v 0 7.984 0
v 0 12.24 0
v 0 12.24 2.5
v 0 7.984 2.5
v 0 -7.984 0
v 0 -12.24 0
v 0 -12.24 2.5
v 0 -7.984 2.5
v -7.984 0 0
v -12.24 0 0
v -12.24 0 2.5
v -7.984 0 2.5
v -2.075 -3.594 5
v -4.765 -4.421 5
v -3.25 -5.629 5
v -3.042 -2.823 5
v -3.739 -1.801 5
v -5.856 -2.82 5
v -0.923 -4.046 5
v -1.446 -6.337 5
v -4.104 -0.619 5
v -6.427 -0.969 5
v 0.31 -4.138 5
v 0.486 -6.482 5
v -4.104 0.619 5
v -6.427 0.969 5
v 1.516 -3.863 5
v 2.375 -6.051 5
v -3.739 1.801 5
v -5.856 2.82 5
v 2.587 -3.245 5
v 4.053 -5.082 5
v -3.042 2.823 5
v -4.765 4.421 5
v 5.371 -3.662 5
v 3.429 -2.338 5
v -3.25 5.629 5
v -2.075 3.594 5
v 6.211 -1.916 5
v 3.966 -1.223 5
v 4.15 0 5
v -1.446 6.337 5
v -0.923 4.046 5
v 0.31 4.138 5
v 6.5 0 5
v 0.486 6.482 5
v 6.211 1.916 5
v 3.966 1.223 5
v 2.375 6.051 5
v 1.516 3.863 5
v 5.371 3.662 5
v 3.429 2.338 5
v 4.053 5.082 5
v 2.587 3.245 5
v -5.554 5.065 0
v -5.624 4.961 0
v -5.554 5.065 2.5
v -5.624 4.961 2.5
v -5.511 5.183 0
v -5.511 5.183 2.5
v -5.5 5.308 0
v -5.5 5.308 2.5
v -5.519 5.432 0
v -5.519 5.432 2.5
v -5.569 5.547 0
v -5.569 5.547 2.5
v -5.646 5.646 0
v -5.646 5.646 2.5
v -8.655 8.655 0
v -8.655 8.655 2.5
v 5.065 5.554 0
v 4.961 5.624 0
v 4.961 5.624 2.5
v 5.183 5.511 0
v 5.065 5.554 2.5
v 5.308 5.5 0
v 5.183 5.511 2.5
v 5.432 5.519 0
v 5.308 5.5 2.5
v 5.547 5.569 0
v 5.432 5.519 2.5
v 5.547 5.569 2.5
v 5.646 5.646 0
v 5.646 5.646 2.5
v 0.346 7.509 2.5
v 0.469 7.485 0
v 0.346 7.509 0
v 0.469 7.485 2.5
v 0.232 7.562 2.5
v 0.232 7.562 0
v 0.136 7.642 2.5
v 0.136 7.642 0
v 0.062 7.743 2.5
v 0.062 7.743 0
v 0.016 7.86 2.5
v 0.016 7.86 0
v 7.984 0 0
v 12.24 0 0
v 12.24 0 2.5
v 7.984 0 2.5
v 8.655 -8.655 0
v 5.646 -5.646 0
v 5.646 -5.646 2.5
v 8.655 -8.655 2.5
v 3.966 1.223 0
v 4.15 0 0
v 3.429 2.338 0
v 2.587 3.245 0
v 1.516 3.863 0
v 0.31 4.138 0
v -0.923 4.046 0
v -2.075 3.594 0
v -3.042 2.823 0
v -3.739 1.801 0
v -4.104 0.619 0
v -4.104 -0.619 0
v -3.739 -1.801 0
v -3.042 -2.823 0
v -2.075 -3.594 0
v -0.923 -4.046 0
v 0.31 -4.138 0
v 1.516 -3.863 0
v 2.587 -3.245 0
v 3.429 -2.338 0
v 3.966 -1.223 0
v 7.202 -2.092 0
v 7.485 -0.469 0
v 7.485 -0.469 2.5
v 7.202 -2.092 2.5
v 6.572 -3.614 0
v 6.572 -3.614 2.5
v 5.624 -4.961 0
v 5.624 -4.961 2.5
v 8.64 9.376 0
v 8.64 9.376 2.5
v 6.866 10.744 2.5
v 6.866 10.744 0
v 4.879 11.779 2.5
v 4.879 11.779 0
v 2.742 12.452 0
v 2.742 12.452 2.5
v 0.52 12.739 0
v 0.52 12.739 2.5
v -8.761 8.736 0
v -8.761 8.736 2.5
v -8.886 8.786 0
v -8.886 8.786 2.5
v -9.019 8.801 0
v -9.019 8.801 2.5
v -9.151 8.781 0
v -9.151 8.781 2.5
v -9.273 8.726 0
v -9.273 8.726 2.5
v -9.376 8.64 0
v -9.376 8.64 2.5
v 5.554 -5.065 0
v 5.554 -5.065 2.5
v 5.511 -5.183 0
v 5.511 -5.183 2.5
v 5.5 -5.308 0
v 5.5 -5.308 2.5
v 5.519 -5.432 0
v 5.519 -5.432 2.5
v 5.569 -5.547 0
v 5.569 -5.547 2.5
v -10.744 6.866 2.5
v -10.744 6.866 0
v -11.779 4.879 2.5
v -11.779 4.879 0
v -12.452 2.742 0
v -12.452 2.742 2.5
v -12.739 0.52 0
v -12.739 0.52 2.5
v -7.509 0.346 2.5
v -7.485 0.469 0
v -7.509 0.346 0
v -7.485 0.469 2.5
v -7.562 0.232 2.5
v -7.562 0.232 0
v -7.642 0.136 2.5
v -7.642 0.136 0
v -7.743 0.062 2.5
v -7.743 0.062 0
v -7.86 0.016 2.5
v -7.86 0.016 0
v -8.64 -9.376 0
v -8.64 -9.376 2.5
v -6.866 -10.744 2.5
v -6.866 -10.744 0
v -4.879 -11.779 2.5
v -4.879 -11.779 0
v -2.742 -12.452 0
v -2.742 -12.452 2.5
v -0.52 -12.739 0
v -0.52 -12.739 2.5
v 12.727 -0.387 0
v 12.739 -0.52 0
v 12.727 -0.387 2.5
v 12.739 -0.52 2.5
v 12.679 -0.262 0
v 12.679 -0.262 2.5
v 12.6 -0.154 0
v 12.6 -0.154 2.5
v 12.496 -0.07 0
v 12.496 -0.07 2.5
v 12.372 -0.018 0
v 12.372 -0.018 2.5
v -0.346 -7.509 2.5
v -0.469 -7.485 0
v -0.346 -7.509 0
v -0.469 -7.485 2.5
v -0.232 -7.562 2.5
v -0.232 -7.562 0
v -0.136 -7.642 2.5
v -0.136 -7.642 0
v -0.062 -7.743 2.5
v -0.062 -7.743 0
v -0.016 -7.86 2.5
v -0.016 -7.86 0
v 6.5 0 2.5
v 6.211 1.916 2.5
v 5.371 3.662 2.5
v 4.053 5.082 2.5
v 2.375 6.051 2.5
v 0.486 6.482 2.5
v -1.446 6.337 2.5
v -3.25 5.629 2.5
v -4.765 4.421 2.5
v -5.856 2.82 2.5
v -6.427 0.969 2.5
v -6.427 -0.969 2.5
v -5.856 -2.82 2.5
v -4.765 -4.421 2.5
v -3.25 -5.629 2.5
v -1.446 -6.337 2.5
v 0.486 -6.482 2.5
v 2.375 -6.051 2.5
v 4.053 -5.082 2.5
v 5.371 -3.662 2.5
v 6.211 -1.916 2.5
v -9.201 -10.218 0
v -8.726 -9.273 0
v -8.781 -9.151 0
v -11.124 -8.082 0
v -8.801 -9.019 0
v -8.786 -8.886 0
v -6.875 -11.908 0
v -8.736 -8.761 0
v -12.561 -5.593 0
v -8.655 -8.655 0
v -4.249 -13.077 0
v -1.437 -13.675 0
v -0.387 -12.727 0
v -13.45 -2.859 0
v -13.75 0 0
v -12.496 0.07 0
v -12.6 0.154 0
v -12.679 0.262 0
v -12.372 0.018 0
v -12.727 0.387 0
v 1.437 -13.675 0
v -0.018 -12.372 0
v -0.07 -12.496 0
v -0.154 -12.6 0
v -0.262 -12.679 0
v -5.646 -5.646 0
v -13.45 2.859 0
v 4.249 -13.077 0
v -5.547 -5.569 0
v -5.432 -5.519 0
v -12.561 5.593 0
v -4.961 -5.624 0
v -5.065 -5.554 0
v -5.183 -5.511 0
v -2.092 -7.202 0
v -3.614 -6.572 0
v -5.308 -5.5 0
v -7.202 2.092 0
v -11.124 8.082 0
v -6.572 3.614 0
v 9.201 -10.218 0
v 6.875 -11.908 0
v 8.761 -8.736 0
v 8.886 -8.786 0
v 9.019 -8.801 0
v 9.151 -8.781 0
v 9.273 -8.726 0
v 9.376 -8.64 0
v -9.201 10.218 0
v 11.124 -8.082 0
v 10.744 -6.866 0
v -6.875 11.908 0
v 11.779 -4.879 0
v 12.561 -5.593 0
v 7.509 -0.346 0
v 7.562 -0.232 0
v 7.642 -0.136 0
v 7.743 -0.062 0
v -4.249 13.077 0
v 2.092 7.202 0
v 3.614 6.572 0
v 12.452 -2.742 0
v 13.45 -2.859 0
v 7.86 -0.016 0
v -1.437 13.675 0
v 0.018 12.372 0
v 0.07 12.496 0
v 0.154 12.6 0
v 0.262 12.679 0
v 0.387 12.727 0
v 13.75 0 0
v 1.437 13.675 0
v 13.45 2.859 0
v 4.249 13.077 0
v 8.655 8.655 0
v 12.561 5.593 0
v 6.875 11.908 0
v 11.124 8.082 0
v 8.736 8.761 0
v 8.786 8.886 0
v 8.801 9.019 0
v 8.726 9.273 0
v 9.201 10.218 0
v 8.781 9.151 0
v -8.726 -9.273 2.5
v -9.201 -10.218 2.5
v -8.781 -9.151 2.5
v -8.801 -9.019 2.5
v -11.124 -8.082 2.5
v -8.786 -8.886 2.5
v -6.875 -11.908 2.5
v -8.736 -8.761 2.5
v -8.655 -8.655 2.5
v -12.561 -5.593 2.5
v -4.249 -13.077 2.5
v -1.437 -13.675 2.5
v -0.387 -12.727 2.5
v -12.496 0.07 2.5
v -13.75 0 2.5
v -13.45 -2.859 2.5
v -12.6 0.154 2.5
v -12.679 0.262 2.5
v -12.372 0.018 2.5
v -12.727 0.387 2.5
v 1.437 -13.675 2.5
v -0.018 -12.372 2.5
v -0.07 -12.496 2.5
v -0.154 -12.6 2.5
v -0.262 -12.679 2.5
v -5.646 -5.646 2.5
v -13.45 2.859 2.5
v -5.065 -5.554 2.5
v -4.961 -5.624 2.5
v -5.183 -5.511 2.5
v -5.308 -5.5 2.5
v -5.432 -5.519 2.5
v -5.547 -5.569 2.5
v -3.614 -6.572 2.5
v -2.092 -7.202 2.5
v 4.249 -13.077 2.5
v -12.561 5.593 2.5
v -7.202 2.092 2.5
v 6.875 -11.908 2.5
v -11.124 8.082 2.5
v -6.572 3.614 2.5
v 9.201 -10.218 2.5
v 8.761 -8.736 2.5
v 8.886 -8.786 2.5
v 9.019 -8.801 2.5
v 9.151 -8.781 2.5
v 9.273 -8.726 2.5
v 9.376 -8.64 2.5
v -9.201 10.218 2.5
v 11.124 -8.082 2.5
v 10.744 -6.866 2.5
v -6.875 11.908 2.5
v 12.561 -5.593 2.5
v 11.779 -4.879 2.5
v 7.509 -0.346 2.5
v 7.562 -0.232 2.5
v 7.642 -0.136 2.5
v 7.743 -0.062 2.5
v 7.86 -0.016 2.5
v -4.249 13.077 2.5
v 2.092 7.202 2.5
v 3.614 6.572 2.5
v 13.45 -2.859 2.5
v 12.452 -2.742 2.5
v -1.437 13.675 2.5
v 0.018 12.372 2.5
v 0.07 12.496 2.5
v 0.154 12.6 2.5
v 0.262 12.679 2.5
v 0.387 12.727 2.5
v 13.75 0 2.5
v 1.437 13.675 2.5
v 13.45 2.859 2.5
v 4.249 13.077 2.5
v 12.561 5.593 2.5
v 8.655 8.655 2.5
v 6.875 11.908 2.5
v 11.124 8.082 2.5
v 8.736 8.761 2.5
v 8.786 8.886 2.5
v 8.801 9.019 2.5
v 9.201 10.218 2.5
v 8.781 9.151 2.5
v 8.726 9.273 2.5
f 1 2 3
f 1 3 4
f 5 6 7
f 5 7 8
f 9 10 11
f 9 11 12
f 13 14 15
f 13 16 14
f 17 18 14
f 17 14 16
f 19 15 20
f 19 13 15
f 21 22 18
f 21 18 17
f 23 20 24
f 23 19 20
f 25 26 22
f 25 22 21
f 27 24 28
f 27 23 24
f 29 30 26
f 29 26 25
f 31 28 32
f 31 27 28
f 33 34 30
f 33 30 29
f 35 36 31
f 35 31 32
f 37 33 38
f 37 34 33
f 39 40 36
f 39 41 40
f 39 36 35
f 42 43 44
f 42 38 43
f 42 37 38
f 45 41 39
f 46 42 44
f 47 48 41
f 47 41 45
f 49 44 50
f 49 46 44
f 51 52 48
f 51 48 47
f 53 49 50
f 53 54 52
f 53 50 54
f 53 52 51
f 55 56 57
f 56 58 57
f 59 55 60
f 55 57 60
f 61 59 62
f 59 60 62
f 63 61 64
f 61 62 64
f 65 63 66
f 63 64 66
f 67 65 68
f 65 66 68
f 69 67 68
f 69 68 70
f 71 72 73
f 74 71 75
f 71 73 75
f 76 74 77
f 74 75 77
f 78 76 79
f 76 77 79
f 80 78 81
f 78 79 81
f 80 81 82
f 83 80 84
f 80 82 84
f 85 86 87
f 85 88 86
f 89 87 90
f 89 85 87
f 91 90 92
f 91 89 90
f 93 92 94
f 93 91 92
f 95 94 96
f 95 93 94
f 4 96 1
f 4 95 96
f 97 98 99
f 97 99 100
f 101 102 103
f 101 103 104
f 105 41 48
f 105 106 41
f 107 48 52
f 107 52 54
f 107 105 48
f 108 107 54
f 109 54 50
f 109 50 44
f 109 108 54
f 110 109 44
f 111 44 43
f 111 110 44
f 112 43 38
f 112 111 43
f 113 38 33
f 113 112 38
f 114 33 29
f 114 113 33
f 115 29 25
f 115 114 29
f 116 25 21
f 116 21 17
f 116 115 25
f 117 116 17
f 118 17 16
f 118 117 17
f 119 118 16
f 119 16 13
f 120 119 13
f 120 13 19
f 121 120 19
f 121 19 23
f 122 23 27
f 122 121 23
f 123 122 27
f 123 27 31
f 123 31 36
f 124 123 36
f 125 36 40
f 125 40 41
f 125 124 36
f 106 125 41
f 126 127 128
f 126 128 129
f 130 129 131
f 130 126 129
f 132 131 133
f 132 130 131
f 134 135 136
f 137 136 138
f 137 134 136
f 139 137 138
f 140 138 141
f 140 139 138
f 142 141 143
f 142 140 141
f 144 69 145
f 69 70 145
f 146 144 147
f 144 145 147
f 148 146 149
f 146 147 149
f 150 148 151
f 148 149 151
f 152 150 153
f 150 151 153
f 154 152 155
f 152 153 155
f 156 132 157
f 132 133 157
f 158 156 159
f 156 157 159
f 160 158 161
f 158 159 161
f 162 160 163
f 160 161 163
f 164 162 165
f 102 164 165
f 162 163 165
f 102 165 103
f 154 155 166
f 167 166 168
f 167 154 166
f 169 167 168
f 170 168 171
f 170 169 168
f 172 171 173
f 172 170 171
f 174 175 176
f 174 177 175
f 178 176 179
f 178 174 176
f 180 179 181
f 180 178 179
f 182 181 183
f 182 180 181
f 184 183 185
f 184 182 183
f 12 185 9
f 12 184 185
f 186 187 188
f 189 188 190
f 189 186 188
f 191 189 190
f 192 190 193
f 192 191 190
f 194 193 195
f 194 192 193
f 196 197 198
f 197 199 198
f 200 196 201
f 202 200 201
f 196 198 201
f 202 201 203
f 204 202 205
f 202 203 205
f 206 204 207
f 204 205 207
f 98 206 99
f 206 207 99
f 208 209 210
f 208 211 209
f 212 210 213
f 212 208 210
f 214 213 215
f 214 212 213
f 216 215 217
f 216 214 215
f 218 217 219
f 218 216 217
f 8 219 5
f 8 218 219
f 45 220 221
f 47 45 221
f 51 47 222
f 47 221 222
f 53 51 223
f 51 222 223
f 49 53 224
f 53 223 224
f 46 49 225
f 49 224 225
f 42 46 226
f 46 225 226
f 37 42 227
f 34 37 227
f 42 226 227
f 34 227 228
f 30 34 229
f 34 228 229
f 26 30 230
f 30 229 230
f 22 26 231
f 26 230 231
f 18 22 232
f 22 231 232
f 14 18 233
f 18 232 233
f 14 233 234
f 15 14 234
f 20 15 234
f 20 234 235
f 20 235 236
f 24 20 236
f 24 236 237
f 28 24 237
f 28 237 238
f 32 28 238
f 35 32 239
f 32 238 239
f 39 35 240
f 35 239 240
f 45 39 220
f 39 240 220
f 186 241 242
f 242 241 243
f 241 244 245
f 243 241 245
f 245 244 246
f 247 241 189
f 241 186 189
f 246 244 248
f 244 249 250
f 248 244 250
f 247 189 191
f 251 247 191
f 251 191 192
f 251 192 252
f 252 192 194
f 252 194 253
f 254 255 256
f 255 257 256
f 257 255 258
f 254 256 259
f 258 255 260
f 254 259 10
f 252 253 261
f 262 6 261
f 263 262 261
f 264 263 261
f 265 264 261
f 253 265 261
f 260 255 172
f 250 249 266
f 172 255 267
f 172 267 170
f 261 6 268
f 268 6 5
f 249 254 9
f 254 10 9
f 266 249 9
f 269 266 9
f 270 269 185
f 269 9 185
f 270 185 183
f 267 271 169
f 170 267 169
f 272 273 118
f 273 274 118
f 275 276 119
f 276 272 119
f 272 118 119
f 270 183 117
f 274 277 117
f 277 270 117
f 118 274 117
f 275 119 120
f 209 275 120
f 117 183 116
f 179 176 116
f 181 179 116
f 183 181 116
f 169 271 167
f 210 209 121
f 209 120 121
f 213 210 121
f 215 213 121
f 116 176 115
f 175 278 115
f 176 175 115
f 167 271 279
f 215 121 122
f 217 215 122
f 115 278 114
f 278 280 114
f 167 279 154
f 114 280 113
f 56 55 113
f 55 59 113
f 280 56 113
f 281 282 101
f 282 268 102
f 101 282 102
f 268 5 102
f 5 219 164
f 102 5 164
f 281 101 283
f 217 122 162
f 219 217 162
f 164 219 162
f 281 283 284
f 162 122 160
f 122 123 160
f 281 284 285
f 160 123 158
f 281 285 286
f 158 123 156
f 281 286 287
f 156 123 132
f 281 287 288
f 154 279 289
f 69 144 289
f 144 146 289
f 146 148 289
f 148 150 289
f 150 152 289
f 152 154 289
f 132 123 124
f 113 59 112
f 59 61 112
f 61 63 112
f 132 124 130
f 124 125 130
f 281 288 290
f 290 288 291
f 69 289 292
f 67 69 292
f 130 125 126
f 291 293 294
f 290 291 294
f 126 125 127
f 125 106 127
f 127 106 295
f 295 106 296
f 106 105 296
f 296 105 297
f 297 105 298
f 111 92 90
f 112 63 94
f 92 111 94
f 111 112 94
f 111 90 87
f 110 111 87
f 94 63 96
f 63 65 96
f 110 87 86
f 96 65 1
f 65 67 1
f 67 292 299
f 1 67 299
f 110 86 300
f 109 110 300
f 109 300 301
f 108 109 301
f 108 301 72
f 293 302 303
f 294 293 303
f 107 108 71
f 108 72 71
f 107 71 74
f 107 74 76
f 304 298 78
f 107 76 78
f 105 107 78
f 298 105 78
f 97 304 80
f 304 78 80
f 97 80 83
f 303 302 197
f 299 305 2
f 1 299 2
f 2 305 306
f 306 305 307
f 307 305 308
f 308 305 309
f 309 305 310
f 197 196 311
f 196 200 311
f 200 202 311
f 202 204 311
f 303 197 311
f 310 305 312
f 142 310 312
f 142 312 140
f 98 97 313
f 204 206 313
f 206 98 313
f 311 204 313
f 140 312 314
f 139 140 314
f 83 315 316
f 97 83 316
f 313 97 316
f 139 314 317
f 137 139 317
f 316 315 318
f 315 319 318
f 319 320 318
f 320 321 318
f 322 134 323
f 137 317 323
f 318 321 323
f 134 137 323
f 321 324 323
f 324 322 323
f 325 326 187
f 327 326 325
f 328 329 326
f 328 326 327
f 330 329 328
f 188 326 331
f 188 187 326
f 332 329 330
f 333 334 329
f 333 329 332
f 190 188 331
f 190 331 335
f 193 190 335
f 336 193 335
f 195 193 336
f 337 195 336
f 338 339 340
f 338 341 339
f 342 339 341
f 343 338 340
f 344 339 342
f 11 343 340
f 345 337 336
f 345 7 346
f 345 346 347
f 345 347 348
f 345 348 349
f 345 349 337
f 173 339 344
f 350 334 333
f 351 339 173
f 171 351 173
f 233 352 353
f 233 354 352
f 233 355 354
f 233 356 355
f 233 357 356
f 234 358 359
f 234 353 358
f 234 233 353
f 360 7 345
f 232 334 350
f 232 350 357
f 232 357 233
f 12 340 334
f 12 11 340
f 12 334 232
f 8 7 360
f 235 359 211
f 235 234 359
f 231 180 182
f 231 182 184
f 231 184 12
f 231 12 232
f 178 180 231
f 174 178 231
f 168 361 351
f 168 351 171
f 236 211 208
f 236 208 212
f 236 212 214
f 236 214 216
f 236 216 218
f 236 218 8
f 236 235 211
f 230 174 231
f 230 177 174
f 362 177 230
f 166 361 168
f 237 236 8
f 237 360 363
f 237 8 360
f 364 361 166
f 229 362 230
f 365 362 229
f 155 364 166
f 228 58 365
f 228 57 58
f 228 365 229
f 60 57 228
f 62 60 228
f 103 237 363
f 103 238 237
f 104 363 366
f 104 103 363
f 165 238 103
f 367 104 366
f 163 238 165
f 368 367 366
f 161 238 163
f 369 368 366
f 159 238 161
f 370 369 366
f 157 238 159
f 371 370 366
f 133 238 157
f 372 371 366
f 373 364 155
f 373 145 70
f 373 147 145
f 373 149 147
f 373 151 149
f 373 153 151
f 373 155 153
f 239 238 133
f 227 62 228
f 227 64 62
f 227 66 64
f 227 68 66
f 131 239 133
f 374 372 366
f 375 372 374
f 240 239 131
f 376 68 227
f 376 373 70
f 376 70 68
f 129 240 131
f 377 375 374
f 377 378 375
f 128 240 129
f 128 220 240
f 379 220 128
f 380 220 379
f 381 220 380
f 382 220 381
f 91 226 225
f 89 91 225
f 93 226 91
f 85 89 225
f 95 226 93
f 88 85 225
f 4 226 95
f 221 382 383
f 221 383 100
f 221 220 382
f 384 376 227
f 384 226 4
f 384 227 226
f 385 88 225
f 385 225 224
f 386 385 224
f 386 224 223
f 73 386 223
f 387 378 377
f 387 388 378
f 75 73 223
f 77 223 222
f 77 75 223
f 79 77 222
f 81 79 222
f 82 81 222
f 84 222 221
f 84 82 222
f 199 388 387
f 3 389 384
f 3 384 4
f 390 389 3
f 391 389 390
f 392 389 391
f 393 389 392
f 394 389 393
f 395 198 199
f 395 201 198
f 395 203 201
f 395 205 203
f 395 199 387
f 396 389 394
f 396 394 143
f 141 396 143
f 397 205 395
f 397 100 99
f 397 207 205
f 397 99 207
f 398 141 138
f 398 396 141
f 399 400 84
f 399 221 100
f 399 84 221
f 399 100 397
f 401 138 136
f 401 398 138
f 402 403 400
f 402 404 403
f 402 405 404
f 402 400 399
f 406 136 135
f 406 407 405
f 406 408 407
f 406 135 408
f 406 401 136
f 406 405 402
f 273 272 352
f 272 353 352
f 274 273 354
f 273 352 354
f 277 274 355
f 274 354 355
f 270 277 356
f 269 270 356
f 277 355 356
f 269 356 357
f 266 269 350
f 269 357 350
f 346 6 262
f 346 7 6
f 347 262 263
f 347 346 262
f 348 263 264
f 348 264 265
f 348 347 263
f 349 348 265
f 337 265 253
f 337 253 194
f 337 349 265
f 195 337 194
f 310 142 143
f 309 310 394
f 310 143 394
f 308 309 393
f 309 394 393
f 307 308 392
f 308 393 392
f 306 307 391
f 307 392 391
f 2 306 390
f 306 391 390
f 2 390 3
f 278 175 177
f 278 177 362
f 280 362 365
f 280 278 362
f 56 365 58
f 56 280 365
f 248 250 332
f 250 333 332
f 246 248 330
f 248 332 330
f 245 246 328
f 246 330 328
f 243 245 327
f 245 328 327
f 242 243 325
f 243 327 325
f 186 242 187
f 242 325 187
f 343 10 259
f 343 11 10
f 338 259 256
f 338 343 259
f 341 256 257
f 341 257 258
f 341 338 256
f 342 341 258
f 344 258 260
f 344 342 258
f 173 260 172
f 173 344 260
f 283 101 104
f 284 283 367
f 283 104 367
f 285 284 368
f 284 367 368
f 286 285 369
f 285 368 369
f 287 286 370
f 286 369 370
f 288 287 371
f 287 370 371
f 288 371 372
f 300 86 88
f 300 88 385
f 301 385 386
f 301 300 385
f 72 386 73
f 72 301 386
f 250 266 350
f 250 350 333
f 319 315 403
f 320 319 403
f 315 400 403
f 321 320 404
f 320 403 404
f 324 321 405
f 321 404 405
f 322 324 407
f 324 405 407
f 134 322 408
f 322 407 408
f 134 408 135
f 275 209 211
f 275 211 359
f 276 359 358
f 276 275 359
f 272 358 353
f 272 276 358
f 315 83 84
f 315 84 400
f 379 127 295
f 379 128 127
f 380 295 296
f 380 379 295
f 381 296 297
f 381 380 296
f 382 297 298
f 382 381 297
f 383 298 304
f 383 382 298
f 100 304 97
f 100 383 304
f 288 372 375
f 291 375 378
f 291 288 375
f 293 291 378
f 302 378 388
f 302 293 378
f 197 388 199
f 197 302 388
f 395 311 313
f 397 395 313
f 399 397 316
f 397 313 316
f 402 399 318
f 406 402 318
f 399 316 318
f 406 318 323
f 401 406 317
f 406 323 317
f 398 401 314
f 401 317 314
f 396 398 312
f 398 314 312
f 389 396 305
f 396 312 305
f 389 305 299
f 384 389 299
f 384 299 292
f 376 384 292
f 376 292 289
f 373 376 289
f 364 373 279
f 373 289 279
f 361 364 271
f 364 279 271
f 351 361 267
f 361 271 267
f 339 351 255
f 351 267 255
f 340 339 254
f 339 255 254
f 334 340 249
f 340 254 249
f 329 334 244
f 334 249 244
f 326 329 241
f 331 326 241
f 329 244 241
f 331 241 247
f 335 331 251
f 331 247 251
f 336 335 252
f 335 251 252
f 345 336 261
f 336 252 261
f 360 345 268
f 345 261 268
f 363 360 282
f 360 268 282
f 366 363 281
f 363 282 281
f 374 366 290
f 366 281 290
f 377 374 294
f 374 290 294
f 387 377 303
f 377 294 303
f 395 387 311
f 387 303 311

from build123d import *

# Parameters (mm, degrees)
SKETCH1_R                = 13.75
SKETCH1_R_2              = 4.15
BOSS_EXTRUDE1_DEPTH      = 2.5
SKETCH2_R                = 6.5
SKETCH2_R_2              = 4.15
BOSS_EXTRUDE2_DEPTH      = 2.5
CUT_EXTRUDE1_DEPTH       = 21.077973005
FILLET1_R                = 0.5
CIRPATTERN1_COUNT        = 4
FILLET1_OF_CIRPATTERN1_R = 0.5


with BuildPart() as part:
    # Sketch1 → Boss-Extrude1 (new body)
    with BuildSketch(Plane.XY):
        Circle(SKETCH1_R)
        Circle(SKETCH1_R_2, mode=Mode.SUBTRACT)
    extrude(amount=BOSS_EXTRUDE1_DEPTH)

    # Sketch2 → Boss-Extrude2 (add)
    with BuildSketch(Plane.XY.offset(2.5)):
        Circle(SKETCH2_R)
        Circle(SKETCH2_R_2, mode=Mode.SUBTRACT)
    extrude(amount=BOSS_EXTRUDE2_DEPTH)

    # Sketch5 → Cut-Extrude1 (cut, through all)
    with BuildSketch(Plane.XY):
        with BuildLine():
            Line((0, 12.75), (0, 7.5))
            ThreePointArc((0, 7.5), (2.870125743, 6.929096494), (5.303300859, 5.303300859))
            Line((5.303300859, 5.303300859), (9.01561146, 9.01561146))
            ThreePointArc((9.01561146, 9.01561146), (4.879213763, 11.77946404), (0, 12.75))
        make_face()
    cut_extrude1 = extrude(amount=CUT_EXTRUDE1_DEPTH, mode=Mode.SUBTRACT)

    # Fillet1
    fillet1_edges = [part.edges().sort_by_distance(p)[0] for p in [
        (0, 7.5, 1.25),
        (5.303300859, 5.303300859, 1.25),
        (9.01561146, 9.01561146, 1.25),
        (0, 12.75, 1.25),
    ]]
    fillet(fillet1_edges, radius=FILLET1_R)

    # CirPattern1: Cut-Extrude1 ×4 about axis
    cirpattern1_axis = Axis((0, 0, 0), (0, 0, 1))
    for i in range(1, CIRPATTERN1_COUNT):
        add(cut_extrude1.rotate(cirpattern1_axis, i * 360 / CIRPATTERN1_COUNT), mode=Mode.SUBTRACT)

    # Fillet1 of CirPattern1
    fillet1_of_cirpattern1_edges = [part.edges().sort_by_distance(p)[0] for p in [
        (-7.5, 0, 1.25),
        (-5.303300859, 5.303300859, 1.25),
        (-9.01561146, 9.01561146, 1.25),
        (-12.75, 0, 1.25),
        (0, -7.5, 1.25),
        (-5.303300859, -5.303300859, 1.25),
        (-9.01561146, -9.01561146, 1.25),
        (0, -12.75, 1.25),
        (7.5, 0, 1.25),
        (5.303300859, -5.303300859, 1.25),
        (9.01561146, -9.01561146, 1.25),
        (12.75, 0, 1.25),
    ]]
    fillet(fillet1_of_cirpattern1_edges, radius=FILLET1_OF_CIRPATTERN1_R)


solid = part.part
